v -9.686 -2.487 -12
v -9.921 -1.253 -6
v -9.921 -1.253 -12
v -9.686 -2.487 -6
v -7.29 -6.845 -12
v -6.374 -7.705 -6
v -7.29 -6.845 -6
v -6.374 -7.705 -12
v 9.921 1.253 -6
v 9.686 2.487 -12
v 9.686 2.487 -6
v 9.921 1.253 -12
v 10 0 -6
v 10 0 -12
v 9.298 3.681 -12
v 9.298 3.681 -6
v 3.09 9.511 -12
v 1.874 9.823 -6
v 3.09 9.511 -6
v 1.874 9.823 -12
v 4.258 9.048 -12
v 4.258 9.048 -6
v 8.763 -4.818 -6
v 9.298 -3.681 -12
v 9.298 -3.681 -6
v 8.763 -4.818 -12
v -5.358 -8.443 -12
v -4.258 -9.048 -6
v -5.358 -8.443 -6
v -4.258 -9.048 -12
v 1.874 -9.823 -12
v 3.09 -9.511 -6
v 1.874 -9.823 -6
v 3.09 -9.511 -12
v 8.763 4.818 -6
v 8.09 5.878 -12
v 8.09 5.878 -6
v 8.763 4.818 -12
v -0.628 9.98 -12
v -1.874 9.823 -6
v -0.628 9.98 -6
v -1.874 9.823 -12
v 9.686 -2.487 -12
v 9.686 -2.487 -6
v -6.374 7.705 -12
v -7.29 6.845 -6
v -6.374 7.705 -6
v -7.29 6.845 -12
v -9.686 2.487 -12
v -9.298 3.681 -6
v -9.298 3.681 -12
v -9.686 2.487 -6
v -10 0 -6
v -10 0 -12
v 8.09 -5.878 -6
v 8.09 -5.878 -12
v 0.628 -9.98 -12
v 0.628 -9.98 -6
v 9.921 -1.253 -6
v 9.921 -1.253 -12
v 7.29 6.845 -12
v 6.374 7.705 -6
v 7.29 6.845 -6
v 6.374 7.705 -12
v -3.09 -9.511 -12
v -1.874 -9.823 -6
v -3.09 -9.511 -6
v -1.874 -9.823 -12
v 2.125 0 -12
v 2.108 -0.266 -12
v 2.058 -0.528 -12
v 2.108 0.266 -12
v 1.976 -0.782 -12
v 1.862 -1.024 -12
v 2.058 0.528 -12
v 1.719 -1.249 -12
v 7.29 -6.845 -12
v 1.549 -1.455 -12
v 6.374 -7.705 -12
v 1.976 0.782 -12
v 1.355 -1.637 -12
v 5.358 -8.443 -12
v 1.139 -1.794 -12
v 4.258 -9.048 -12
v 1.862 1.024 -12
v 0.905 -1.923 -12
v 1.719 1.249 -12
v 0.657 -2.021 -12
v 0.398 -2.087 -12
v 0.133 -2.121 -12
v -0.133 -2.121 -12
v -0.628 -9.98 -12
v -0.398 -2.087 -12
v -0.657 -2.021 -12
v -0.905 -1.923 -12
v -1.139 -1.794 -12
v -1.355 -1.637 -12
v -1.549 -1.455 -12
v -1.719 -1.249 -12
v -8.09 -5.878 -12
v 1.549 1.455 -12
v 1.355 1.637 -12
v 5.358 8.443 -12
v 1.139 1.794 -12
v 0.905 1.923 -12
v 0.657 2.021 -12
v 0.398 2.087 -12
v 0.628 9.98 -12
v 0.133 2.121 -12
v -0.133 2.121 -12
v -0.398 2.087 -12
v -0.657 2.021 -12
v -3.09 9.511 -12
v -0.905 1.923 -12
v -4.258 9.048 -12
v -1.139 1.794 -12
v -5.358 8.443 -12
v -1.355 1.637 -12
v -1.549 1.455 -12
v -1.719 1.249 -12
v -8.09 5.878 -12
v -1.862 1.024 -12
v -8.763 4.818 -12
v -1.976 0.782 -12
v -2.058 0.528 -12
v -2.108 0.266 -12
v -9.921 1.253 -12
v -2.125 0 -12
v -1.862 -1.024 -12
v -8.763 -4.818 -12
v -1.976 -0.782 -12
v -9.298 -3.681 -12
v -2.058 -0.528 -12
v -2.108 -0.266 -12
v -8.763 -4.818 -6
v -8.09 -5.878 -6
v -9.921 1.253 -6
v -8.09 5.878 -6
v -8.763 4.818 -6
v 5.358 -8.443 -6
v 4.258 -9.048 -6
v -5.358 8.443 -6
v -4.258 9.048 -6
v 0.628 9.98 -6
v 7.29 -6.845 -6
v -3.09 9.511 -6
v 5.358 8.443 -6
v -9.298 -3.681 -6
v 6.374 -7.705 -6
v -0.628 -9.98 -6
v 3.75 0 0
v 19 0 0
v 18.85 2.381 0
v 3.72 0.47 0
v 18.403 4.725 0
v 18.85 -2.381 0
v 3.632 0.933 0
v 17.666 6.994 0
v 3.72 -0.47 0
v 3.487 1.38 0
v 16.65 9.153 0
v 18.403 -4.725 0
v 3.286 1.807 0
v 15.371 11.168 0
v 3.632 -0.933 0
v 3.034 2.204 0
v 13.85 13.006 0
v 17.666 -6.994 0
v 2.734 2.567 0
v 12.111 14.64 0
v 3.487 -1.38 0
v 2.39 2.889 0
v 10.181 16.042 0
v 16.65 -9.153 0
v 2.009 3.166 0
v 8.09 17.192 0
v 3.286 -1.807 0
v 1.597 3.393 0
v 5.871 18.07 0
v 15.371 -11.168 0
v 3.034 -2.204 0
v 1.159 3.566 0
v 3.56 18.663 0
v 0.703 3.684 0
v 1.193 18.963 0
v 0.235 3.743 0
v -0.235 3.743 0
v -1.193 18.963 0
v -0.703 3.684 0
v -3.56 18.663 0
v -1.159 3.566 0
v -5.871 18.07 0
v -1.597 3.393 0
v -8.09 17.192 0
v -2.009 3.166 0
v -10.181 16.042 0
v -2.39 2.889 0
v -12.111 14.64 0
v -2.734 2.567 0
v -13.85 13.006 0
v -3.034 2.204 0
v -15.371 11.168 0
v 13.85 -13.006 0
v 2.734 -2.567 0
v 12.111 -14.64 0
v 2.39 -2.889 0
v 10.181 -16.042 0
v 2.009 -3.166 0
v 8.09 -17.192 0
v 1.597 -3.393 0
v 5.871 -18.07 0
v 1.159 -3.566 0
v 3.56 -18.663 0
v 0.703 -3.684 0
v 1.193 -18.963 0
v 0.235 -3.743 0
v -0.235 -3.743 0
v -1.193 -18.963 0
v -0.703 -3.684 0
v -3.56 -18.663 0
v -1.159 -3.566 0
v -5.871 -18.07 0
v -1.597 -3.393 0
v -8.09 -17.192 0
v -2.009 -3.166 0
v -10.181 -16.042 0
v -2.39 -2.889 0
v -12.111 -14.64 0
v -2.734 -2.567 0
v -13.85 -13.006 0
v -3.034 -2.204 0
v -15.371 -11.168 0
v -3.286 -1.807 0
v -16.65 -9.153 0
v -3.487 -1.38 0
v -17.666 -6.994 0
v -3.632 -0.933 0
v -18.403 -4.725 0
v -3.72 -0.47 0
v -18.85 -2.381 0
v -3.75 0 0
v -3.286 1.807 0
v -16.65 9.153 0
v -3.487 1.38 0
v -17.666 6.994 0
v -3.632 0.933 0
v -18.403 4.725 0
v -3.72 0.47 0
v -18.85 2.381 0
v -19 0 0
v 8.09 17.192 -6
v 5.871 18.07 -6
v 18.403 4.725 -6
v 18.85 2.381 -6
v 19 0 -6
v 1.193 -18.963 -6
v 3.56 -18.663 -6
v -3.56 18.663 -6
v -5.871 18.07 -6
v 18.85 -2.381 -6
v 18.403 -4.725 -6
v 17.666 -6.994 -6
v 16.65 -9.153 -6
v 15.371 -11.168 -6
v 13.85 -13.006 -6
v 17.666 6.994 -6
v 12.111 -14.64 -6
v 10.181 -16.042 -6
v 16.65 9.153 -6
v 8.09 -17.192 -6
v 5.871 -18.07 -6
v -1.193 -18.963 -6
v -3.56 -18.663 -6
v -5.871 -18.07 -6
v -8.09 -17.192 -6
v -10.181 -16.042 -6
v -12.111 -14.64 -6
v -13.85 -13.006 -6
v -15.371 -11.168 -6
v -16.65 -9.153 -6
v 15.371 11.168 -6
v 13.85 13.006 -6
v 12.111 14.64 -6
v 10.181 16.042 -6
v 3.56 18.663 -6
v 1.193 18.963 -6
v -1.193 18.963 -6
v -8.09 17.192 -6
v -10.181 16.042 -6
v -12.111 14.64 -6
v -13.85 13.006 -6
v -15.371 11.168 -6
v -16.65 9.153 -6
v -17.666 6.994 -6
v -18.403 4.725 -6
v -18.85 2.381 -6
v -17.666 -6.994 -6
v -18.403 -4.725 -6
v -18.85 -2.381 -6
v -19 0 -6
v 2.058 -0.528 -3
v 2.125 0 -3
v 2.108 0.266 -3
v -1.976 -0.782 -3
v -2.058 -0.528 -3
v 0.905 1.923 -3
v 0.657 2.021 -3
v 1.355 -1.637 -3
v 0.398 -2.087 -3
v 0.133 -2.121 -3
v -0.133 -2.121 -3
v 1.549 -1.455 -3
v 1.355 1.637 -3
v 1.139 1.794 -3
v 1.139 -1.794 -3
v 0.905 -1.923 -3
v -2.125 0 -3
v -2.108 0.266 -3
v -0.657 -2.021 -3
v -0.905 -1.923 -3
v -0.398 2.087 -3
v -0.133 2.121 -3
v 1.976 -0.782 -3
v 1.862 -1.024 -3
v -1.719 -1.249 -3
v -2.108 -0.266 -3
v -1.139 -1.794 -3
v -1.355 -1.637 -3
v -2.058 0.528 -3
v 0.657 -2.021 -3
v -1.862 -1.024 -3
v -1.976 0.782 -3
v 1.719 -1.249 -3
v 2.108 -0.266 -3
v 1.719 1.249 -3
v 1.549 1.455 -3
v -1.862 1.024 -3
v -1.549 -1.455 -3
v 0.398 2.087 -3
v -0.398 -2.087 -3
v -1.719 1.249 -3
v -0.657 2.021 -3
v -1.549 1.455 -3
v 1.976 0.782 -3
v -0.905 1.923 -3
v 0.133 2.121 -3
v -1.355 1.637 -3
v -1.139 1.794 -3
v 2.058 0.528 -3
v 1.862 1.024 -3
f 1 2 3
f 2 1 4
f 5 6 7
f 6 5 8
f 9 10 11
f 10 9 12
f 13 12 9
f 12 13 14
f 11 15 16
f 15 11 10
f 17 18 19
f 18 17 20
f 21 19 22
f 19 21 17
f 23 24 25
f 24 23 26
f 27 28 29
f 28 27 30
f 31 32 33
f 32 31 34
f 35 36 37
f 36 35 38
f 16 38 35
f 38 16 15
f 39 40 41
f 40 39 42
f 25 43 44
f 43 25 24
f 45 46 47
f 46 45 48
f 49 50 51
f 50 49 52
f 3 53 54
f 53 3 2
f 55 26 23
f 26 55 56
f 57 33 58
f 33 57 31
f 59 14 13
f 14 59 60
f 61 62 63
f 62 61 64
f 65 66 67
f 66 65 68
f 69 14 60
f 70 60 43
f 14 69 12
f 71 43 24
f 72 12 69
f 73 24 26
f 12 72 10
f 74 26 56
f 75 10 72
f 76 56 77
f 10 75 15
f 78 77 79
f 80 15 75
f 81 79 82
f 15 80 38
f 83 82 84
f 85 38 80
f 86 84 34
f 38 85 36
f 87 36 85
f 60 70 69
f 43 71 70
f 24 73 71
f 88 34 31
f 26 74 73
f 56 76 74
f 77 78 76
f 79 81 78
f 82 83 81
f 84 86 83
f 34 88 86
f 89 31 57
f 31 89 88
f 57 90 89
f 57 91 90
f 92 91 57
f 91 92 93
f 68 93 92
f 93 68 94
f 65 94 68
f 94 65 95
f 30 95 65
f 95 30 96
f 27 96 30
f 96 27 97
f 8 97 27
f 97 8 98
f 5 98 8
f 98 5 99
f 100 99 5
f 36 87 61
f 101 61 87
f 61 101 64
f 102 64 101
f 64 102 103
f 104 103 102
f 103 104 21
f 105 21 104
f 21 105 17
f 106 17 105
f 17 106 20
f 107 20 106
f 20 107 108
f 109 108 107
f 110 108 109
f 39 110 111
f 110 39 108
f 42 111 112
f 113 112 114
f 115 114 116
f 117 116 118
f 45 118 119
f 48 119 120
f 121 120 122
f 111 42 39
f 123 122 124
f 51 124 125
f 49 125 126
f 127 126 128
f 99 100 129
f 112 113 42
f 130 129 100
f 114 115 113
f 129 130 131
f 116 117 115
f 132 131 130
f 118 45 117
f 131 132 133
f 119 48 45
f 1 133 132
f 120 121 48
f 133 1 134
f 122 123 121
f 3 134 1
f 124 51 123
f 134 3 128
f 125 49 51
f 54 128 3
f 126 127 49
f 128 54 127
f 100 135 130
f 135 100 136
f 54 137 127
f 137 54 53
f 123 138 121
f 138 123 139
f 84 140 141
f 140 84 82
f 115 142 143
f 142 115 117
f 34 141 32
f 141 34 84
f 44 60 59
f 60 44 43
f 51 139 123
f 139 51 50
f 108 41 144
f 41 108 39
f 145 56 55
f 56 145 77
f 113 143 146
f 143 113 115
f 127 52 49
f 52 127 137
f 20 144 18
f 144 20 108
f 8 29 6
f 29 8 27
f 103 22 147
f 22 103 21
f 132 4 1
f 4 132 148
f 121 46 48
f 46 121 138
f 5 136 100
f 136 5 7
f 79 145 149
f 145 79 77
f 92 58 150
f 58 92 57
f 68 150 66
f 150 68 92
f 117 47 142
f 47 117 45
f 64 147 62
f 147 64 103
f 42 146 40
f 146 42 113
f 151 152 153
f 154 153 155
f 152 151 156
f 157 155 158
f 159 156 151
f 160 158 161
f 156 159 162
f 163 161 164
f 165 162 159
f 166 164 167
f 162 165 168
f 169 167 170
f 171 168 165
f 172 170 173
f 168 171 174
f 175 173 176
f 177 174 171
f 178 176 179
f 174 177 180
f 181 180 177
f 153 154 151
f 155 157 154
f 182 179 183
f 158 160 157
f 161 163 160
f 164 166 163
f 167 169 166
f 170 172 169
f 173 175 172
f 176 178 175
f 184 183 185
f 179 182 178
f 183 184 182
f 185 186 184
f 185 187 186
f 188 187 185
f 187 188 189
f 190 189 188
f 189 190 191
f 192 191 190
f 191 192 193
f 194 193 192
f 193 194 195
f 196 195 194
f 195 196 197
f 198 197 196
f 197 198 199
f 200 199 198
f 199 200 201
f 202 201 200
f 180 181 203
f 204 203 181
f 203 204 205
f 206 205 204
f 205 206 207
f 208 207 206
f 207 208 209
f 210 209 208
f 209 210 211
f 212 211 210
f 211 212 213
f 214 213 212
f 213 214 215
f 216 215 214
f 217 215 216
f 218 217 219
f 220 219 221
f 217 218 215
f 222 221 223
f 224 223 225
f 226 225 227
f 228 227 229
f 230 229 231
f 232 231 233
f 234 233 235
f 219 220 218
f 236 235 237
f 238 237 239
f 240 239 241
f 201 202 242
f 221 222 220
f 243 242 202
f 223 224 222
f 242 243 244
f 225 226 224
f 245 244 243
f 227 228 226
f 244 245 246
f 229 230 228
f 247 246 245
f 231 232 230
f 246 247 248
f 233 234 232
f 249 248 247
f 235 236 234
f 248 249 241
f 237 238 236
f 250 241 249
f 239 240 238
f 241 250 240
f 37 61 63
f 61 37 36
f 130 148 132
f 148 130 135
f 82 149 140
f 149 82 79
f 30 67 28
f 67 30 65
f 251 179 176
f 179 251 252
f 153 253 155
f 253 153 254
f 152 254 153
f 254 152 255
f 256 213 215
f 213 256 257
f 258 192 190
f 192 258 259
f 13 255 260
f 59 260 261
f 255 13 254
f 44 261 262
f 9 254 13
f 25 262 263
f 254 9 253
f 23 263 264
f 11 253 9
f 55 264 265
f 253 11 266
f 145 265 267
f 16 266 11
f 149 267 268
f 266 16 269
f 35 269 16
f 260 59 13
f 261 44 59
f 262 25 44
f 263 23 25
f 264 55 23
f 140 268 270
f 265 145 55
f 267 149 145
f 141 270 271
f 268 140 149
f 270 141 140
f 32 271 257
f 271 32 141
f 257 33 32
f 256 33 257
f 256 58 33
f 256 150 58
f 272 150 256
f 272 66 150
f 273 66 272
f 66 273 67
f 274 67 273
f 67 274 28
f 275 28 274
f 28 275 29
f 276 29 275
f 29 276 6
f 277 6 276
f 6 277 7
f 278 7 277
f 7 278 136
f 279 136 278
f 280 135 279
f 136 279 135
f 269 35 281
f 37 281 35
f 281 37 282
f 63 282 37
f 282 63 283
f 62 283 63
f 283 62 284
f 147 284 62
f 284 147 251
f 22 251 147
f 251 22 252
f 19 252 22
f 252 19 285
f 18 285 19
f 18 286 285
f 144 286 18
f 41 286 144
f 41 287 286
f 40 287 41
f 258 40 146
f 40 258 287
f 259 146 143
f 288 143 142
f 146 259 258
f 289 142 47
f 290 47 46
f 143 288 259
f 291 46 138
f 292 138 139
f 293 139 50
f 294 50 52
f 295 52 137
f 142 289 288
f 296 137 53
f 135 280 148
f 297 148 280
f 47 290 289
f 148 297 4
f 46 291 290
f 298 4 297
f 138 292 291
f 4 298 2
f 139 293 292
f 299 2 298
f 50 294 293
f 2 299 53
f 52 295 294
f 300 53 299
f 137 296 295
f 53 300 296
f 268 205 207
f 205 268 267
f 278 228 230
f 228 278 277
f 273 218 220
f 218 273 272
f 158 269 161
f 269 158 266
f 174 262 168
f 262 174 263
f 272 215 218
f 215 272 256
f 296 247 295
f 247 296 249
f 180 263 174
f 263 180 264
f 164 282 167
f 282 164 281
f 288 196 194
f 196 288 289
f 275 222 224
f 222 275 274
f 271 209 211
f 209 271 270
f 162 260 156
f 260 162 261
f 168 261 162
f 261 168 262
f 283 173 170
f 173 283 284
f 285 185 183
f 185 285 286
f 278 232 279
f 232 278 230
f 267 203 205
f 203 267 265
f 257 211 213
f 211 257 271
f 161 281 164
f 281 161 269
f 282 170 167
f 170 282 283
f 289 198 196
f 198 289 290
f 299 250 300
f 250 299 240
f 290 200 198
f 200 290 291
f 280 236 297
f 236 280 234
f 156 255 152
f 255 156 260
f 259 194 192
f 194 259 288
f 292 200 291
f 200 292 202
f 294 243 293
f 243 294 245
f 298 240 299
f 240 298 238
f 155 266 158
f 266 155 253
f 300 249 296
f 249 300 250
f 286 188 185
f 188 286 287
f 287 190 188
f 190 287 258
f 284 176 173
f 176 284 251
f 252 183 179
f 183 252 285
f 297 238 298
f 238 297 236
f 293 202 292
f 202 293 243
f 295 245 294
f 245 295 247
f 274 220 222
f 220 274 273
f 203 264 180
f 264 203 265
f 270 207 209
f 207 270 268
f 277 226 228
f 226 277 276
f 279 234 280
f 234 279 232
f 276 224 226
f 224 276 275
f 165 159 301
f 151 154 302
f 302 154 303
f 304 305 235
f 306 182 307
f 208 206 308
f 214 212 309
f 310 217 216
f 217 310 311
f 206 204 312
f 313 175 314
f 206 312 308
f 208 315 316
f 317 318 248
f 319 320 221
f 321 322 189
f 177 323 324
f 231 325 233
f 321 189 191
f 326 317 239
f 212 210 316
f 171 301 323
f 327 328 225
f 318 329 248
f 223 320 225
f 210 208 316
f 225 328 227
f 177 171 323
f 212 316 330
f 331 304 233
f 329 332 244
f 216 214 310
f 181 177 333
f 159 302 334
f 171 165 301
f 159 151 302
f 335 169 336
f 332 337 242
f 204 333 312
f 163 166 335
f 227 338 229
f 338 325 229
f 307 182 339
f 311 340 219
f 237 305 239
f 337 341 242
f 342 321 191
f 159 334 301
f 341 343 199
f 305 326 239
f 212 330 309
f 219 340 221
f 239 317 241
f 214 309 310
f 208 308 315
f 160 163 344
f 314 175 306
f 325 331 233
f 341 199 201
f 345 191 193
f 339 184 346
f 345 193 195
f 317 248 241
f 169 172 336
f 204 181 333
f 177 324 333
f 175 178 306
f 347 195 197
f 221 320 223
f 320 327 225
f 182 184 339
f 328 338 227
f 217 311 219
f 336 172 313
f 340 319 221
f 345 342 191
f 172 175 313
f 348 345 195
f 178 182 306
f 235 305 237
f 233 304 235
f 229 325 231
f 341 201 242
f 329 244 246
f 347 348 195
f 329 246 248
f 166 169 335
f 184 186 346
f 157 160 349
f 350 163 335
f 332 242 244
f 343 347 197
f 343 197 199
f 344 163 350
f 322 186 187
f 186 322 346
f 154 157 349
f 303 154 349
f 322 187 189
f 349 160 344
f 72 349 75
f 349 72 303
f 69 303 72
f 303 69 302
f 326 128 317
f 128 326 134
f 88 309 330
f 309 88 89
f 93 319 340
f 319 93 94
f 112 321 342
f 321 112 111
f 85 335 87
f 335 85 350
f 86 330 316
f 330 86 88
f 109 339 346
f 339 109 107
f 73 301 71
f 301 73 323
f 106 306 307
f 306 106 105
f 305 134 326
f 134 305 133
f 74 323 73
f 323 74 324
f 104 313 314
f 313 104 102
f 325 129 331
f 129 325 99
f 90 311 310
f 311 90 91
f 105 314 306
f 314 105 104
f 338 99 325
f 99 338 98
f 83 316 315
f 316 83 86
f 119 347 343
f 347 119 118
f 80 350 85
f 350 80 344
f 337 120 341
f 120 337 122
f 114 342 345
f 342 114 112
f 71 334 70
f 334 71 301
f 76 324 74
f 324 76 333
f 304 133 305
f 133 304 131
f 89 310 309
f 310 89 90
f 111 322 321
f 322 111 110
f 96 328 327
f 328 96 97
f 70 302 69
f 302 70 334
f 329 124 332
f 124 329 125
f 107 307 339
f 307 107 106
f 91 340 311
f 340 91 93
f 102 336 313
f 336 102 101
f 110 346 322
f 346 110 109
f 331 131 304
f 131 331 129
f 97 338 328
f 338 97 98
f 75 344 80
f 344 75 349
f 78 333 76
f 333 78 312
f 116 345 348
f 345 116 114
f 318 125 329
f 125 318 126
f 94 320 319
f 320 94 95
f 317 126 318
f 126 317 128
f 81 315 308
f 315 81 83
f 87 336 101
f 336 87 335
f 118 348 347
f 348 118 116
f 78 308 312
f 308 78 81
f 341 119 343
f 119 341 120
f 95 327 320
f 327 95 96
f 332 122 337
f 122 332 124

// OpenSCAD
$fn = 50;


difference() {
	union() {
		translate(v = [0, 0, -12.0000000000]) {
			cylinder(h = 12, r = 10.0000000000);
		}
		translate(v = [0, 0, -6.0000000000]) {
			cylinder(h = 6, r = 19.0000000000);
		}
	}
	union() {
		translate(v = [0, 0, 0]) {
			rotate(a = [0, 0, 0]) {
				difference() {
					union() {
						#translate(v = [0, 0, -12.0000000000]) {
							cylinder(h = 12, r = 2.0000000000);
						}
						#translate(v = [0, 0, -3]) {
							cylinder(h = 3, r1 = 2.1250000000, r2 = 3.7500000000);
						}
						#translate(v = [0, 0, -12.0000000000]) {
							cylinder(h = 12, r = 2.1250000000);
						}
						#translate(v = [0, 0, -12.0000000000]) {
							cylinder(h = 12, r = 2.0000000000);
						}
					}
					union();
				}
			}
		}
	}
}
